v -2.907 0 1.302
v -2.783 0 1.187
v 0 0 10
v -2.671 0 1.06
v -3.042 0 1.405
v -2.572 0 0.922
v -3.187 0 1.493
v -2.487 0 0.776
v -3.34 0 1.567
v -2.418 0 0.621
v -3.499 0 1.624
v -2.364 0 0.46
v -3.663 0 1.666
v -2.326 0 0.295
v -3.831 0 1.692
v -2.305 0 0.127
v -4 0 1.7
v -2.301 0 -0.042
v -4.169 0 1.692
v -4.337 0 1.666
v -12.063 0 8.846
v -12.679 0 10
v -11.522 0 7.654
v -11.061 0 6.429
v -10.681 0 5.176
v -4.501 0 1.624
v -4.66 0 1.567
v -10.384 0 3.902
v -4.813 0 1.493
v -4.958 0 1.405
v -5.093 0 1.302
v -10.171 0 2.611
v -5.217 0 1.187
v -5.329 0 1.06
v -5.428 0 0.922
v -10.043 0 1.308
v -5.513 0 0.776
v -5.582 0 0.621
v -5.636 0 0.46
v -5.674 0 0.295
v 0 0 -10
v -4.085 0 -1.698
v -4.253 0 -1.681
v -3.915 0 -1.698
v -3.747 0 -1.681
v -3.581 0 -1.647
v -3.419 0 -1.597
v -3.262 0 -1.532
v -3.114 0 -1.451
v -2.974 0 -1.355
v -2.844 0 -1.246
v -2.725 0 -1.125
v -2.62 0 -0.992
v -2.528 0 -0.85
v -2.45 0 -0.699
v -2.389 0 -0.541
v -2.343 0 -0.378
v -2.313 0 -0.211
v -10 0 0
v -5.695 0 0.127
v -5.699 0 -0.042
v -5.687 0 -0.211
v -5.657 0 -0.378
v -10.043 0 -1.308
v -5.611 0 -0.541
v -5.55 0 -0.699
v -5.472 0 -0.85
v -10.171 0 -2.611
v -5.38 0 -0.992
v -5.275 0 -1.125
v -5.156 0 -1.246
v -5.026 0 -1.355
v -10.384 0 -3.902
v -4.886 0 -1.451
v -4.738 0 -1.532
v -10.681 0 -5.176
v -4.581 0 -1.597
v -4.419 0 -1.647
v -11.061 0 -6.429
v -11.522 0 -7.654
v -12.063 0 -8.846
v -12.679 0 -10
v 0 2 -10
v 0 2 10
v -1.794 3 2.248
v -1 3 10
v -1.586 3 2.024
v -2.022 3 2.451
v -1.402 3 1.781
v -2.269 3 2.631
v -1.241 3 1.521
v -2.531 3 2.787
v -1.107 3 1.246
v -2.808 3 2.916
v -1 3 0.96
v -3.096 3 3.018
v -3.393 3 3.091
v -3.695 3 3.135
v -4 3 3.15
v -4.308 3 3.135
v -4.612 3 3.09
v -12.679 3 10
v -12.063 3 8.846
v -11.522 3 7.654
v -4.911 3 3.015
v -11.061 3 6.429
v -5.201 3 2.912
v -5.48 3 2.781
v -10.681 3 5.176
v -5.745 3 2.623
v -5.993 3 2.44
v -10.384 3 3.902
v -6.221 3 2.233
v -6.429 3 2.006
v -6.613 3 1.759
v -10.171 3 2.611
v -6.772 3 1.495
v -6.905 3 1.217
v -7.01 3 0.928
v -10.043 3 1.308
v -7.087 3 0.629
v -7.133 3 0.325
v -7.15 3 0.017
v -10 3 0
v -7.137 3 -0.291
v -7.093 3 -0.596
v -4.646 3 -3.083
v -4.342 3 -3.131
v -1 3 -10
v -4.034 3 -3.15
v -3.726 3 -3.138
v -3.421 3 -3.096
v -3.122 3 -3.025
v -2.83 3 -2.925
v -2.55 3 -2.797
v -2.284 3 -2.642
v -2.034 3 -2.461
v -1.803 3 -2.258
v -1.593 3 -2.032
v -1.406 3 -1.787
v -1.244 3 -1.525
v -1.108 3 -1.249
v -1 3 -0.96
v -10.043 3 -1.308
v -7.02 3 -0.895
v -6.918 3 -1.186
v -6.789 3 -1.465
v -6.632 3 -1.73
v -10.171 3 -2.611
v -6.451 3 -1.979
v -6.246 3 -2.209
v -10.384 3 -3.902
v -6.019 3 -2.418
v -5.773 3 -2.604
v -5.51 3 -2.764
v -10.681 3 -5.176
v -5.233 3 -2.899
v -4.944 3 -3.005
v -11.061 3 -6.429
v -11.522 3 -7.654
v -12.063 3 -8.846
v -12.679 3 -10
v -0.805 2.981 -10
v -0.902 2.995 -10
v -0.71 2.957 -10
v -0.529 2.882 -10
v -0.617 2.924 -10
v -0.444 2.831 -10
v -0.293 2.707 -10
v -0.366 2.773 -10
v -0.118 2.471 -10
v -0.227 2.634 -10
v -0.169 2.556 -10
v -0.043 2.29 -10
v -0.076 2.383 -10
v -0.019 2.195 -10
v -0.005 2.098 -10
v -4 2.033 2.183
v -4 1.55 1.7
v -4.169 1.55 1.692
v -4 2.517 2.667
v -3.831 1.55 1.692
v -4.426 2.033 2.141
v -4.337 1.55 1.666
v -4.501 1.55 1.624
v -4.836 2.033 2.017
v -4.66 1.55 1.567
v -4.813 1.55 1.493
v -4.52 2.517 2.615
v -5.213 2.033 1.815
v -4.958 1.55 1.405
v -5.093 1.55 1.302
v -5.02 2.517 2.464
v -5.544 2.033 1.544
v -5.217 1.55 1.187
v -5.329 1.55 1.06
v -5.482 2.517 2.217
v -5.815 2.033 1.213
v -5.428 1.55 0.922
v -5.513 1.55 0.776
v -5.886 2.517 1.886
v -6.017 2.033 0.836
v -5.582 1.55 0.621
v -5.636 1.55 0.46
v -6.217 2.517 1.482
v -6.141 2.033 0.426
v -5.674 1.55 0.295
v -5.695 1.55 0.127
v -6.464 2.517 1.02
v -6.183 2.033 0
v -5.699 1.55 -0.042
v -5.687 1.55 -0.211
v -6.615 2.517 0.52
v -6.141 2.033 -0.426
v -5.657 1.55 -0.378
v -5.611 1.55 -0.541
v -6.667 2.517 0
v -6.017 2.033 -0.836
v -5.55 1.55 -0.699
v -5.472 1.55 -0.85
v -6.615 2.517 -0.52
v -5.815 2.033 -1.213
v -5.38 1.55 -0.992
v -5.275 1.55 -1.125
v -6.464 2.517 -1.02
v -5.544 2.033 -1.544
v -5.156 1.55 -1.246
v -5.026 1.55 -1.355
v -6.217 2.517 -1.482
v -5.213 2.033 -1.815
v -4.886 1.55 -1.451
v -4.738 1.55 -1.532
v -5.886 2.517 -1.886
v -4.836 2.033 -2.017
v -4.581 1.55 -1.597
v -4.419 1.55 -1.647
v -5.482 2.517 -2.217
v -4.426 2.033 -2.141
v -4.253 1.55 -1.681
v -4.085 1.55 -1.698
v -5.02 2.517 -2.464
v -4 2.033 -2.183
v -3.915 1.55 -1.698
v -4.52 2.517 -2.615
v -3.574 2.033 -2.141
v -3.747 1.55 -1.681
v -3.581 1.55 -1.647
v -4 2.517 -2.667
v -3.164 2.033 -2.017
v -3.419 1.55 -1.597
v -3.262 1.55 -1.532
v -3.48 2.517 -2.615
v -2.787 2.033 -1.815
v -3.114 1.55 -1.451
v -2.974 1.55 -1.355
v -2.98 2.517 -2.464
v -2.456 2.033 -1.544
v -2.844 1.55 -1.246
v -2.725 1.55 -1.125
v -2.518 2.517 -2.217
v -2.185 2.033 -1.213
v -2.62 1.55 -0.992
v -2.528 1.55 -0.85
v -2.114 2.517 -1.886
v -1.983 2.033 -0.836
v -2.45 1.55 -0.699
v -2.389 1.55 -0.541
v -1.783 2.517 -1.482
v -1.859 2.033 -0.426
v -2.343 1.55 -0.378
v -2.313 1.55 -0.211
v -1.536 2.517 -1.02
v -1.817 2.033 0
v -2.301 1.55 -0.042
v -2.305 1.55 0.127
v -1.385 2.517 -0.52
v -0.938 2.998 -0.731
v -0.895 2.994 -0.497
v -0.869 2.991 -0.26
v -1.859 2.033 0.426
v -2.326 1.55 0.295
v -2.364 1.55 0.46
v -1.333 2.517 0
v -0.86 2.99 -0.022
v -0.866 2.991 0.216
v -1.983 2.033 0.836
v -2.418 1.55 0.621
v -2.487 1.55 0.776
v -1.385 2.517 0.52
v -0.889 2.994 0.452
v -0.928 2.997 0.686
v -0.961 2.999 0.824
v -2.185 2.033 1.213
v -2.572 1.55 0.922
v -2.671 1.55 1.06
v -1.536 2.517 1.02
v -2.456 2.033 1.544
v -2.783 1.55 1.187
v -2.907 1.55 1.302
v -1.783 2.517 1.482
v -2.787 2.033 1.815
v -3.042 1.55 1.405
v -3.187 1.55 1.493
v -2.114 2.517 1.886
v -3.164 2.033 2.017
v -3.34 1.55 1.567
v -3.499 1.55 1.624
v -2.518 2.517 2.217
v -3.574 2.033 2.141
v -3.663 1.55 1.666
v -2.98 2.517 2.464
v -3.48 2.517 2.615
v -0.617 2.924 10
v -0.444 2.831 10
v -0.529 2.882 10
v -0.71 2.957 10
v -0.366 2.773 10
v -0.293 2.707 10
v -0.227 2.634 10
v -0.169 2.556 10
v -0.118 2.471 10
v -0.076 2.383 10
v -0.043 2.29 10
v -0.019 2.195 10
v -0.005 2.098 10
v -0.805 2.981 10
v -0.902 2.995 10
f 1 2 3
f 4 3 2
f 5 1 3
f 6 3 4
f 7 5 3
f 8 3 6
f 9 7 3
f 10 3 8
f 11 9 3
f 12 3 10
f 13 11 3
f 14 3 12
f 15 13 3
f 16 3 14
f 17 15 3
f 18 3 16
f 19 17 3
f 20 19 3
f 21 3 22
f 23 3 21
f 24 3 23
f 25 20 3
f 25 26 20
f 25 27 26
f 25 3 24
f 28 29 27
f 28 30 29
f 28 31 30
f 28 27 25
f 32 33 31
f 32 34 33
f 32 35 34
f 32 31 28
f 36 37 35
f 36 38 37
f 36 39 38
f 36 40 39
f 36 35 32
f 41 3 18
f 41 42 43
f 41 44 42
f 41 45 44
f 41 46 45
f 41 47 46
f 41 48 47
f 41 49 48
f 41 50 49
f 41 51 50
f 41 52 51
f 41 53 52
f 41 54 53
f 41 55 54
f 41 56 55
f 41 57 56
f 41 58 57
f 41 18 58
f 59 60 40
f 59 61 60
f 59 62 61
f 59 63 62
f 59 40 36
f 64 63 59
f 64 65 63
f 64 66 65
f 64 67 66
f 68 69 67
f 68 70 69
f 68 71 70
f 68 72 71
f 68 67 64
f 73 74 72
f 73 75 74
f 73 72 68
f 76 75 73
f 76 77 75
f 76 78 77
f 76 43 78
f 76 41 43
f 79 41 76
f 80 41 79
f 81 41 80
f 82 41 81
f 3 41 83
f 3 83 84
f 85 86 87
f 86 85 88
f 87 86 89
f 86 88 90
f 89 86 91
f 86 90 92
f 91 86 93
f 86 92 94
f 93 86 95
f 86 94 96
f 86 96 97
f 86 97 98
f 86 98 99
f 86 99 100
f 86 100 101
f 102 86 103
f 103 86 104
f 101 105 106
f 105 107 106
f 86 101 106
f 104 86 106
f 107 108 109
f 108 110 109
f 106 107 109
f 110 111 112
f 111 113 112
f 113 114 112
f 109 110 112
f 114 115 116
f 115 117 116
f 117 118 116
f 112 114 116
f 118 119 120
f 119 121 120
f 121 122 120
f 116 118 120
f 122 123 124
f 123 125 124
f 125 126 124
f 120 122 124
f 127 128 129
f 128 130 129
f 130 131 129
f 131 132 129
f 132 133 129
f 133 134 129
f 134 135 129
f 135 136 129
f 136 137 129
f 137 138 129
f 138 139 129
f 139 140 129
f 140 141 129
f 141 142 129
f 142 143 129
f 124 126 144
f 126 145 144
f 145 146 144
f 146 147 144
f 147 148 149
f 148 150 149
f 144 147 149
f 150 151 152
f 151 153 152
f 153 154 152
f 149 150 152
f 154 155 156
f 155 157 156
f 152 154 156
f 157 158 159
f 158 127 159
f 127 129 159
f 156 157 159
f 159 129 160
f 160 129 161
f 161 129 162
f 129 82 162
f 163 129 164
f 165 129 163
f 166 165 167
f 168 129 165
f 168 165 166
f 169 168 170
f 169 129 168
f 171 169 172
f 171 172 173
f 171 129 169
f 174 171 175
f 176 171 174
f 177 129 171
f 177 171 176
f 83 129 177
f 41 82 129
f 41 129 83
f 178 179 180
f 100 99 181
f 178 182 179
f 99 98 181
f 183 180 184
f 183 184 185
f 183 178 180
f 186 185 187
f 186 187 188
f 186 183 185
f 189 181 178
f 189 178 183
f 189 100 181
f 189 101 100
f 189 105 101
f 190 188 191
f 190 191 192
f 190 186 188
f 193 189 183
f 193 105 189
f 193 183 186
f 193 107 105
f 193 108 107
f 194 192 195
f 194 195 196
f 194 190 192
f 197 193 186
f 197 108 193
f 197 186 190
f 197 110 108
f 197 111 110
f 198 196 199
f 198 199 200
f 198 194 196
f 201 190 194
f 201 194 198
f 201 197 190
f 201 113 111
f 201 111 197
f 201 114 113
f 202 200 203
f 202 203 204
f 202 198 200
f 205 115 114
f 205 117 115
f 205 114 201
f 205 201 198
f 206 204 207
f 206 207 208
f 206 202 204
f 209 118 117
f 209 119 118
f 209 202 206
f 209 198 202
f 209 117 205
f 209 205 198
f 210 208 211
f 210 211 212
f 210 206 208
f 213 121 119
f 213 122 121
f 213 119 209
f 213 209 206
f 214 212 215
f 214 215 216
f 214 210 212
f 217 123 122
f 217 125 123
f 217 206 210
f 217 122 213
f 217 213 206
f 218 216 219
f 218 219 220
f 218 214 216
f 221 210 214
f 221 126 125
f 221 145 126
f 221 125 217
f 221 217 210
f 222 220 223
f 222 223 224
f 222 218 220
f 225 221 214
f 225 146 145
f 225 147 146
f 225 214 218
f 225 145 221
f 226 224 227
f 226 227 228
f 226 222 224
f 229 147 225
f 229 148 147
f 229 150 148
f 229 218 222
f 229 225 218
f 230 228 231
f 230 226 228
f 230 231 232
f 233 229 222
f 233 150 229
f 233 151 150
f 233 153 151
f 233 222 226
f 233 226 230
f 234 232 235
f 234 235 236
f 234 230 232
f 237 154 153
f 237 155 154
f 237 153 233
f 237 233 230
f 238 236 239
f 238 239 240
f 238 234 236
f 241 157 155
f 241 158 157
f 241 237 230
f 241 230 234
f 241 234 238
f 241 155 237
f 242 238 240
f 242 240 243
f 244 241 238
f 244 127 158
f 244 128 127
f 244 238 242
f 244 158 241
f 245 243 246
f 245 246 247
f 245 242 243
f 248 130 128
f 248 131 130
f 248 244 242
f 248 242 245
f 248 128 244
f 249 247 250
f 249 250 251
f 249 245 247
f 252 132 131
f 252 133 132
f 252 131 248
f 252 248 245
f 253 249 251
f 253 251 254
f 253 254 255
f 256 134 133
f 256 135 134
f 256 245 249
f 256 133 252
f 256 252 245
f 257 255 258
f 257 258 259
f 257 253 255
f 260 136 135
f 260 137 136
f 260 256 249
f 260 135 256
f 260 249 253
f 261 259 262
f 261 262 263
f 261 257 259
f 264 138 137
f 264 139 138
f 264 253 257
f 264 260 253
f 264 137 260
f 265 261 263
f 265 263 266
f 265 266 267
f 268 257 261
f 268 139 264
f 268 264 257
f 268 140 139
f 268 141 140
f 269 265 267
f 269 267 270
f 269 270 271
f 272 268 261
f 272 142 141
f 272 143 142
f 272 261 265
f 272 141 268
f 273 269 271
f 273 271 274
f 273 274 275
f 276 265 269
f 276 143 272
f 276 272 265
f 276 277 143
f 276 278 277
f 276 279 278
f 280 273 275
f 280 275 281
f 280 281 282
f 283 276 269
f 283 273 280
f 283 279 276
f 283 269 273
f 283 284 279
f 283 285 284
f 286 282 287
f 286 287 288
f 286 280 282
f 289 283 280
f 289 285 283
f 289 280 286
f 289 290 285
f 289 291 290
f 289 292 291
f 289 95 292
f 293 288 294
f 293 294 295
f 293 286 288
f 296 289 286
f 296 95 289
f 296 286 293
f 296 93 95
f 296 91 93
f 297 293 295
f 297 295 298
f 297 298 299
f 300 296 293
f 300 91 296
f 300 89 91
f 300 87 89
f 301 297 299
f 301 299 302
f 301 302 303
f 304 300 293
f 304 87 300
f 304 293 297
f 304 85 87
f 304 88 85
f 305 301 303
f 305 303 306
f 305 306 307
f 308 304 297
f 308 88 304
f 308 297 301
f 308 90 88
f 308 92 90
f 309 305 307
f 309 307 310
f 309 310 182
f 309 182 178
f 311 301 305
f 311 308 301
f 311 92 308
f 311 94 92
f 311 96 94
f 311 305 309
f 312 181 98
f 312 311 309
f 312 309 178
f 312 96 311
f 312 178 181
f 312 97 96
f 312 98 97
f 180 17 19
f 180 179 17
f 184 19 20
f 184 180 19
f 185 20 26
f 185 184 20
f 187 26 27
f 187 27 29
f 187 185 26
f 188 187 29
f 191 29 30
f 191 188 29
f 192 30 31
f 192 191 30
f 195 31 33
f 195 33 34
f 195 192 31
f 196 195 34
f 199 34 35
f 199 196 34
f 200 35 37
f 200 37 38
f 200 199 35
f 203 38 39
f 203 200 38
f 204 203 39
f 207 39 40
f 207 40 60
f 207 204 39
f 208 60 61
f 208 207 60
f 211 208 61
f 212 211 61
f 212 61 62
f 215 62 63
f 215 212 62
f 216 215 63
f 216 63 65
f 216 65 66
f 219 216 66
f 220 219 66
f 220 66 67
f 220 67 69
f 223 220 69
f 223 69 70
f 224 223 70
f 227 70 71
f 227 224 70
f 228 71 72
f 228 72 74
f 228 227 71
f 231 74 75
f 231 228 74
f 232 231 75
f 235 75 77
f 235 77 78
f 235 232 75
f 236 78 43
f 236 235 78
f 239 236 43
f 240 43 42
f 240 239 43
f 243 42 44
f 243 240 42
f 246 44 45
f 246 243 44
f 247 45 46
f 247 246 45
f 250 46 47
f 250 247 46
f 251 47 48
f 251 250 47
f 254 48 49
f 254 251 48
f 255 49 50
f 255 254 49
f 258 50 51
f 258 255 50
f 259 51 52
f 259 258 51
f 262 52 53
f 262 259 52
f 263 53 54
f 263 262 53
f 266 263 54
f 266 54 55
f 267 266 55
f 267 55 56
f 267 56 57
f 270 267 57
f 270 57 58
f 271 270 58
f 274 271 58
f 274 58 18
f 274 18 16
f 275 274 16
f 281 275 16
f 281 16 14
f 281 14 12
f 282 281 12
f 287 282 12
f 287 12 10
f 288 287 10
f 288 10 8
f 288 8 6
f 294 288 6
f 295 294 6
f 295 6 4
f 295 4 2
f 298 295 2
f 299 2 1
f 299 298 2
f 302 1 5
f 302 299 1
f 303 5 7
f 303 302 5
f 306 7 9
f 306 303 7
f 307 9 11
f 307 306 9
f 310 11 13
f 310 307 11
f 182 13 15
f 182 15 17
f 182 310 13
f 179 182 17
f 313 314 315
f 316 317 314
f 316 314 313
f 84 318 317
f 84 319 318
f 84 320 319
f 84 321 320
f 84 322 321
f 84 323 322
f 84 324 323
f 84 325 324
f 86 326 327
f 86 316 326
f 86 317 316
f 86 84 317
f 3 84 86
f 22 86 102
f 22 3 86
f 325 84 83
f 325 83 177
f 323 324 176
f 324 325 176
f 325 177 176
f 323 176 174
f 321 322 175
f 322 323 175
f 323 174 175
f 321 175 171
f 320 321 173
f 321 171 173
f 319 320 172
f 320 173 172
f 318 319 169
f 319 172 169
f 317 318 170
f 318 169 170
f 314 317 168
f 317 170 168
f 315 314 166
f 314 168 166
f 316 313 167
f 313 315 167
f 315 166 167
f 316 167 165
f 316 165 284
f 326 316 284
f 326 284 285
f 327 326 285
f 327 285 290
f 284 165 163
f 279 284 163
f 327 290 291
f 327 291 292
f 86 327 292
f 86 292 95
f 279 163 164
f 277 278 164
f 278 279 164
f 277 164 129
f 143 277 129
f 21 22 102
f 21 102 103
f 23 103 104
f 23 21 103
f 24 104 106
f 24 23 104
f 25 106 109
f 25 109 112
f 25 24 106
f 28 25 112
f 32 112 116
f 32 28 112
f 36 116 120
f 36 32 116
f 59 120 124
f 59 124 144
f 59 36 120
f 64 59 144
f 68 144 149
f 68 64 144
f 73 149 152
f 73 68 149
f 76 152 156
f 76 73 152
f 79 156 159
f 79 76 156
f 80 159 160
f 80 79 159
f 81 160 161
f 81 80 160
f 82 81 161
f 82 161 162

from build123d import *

# Parameters (mm, degrees)
BOSS_EXTRU_1_DEPTH = 3
CONG_1_R           = 1


with BuildPart() as part:
    # Esquisse1 → Boss.-Extru.1 (new body)
    with BuildSketch(Plane(origin=(0, 0, 0), x_dir=(1, 0, 0), z_dir=(0, 1, 0))):
        with BuildLine():
            Line((0, 10), (0, -10))
            Line((0, -10), (-12.679491924, -10))
            ThreePointArc((-12.679491924, -10), (-10, 0), (-12.679491924, 10))
            Line((-12.679491924, 10), (0, 10))
        make_face()
    extrude(amount=BOSS_EXTRU_1_DEPTH)

    # Esquisse3 → Fraisage pour vis à tête fraisée M31 (revolve, cut)
    with BuildSketch(Plane(origin=(-4, 3, 0), x_dir=(0, 0, 1), z_dir=(1, 0, 0))):
        Polygon((0, 0), (0, 3), (1.7, 3), (1.7, 1.45), (3.15, 0), align=None)
    revolve(axis=Axis((-4, 9.35, 0), (0, -1, 0)), mode=Mode.SUBTRACT)

    # Congé1
    # the kernel refuses this fillet: 1 mm, written as the material it takes off along each edge
    with BuildSketch(Plane(origin=(0, 3, -12.5), x_dir=(0, -1, 0), z_dir=(0, 0, 1))) as cong_1_piece_1:
        with BuildLine():
            CenterArc((CONG_1_R, -CONG_1_R), CONG_1_R, 90, 90)
            Line((0, -CONG_1_R), (0, 0))
            Line((0, 0), (CONG_1_R, 0))
        make_face()
    extrude(amount=25, mode=Mode.SUBTRACT)


solid = part.part
